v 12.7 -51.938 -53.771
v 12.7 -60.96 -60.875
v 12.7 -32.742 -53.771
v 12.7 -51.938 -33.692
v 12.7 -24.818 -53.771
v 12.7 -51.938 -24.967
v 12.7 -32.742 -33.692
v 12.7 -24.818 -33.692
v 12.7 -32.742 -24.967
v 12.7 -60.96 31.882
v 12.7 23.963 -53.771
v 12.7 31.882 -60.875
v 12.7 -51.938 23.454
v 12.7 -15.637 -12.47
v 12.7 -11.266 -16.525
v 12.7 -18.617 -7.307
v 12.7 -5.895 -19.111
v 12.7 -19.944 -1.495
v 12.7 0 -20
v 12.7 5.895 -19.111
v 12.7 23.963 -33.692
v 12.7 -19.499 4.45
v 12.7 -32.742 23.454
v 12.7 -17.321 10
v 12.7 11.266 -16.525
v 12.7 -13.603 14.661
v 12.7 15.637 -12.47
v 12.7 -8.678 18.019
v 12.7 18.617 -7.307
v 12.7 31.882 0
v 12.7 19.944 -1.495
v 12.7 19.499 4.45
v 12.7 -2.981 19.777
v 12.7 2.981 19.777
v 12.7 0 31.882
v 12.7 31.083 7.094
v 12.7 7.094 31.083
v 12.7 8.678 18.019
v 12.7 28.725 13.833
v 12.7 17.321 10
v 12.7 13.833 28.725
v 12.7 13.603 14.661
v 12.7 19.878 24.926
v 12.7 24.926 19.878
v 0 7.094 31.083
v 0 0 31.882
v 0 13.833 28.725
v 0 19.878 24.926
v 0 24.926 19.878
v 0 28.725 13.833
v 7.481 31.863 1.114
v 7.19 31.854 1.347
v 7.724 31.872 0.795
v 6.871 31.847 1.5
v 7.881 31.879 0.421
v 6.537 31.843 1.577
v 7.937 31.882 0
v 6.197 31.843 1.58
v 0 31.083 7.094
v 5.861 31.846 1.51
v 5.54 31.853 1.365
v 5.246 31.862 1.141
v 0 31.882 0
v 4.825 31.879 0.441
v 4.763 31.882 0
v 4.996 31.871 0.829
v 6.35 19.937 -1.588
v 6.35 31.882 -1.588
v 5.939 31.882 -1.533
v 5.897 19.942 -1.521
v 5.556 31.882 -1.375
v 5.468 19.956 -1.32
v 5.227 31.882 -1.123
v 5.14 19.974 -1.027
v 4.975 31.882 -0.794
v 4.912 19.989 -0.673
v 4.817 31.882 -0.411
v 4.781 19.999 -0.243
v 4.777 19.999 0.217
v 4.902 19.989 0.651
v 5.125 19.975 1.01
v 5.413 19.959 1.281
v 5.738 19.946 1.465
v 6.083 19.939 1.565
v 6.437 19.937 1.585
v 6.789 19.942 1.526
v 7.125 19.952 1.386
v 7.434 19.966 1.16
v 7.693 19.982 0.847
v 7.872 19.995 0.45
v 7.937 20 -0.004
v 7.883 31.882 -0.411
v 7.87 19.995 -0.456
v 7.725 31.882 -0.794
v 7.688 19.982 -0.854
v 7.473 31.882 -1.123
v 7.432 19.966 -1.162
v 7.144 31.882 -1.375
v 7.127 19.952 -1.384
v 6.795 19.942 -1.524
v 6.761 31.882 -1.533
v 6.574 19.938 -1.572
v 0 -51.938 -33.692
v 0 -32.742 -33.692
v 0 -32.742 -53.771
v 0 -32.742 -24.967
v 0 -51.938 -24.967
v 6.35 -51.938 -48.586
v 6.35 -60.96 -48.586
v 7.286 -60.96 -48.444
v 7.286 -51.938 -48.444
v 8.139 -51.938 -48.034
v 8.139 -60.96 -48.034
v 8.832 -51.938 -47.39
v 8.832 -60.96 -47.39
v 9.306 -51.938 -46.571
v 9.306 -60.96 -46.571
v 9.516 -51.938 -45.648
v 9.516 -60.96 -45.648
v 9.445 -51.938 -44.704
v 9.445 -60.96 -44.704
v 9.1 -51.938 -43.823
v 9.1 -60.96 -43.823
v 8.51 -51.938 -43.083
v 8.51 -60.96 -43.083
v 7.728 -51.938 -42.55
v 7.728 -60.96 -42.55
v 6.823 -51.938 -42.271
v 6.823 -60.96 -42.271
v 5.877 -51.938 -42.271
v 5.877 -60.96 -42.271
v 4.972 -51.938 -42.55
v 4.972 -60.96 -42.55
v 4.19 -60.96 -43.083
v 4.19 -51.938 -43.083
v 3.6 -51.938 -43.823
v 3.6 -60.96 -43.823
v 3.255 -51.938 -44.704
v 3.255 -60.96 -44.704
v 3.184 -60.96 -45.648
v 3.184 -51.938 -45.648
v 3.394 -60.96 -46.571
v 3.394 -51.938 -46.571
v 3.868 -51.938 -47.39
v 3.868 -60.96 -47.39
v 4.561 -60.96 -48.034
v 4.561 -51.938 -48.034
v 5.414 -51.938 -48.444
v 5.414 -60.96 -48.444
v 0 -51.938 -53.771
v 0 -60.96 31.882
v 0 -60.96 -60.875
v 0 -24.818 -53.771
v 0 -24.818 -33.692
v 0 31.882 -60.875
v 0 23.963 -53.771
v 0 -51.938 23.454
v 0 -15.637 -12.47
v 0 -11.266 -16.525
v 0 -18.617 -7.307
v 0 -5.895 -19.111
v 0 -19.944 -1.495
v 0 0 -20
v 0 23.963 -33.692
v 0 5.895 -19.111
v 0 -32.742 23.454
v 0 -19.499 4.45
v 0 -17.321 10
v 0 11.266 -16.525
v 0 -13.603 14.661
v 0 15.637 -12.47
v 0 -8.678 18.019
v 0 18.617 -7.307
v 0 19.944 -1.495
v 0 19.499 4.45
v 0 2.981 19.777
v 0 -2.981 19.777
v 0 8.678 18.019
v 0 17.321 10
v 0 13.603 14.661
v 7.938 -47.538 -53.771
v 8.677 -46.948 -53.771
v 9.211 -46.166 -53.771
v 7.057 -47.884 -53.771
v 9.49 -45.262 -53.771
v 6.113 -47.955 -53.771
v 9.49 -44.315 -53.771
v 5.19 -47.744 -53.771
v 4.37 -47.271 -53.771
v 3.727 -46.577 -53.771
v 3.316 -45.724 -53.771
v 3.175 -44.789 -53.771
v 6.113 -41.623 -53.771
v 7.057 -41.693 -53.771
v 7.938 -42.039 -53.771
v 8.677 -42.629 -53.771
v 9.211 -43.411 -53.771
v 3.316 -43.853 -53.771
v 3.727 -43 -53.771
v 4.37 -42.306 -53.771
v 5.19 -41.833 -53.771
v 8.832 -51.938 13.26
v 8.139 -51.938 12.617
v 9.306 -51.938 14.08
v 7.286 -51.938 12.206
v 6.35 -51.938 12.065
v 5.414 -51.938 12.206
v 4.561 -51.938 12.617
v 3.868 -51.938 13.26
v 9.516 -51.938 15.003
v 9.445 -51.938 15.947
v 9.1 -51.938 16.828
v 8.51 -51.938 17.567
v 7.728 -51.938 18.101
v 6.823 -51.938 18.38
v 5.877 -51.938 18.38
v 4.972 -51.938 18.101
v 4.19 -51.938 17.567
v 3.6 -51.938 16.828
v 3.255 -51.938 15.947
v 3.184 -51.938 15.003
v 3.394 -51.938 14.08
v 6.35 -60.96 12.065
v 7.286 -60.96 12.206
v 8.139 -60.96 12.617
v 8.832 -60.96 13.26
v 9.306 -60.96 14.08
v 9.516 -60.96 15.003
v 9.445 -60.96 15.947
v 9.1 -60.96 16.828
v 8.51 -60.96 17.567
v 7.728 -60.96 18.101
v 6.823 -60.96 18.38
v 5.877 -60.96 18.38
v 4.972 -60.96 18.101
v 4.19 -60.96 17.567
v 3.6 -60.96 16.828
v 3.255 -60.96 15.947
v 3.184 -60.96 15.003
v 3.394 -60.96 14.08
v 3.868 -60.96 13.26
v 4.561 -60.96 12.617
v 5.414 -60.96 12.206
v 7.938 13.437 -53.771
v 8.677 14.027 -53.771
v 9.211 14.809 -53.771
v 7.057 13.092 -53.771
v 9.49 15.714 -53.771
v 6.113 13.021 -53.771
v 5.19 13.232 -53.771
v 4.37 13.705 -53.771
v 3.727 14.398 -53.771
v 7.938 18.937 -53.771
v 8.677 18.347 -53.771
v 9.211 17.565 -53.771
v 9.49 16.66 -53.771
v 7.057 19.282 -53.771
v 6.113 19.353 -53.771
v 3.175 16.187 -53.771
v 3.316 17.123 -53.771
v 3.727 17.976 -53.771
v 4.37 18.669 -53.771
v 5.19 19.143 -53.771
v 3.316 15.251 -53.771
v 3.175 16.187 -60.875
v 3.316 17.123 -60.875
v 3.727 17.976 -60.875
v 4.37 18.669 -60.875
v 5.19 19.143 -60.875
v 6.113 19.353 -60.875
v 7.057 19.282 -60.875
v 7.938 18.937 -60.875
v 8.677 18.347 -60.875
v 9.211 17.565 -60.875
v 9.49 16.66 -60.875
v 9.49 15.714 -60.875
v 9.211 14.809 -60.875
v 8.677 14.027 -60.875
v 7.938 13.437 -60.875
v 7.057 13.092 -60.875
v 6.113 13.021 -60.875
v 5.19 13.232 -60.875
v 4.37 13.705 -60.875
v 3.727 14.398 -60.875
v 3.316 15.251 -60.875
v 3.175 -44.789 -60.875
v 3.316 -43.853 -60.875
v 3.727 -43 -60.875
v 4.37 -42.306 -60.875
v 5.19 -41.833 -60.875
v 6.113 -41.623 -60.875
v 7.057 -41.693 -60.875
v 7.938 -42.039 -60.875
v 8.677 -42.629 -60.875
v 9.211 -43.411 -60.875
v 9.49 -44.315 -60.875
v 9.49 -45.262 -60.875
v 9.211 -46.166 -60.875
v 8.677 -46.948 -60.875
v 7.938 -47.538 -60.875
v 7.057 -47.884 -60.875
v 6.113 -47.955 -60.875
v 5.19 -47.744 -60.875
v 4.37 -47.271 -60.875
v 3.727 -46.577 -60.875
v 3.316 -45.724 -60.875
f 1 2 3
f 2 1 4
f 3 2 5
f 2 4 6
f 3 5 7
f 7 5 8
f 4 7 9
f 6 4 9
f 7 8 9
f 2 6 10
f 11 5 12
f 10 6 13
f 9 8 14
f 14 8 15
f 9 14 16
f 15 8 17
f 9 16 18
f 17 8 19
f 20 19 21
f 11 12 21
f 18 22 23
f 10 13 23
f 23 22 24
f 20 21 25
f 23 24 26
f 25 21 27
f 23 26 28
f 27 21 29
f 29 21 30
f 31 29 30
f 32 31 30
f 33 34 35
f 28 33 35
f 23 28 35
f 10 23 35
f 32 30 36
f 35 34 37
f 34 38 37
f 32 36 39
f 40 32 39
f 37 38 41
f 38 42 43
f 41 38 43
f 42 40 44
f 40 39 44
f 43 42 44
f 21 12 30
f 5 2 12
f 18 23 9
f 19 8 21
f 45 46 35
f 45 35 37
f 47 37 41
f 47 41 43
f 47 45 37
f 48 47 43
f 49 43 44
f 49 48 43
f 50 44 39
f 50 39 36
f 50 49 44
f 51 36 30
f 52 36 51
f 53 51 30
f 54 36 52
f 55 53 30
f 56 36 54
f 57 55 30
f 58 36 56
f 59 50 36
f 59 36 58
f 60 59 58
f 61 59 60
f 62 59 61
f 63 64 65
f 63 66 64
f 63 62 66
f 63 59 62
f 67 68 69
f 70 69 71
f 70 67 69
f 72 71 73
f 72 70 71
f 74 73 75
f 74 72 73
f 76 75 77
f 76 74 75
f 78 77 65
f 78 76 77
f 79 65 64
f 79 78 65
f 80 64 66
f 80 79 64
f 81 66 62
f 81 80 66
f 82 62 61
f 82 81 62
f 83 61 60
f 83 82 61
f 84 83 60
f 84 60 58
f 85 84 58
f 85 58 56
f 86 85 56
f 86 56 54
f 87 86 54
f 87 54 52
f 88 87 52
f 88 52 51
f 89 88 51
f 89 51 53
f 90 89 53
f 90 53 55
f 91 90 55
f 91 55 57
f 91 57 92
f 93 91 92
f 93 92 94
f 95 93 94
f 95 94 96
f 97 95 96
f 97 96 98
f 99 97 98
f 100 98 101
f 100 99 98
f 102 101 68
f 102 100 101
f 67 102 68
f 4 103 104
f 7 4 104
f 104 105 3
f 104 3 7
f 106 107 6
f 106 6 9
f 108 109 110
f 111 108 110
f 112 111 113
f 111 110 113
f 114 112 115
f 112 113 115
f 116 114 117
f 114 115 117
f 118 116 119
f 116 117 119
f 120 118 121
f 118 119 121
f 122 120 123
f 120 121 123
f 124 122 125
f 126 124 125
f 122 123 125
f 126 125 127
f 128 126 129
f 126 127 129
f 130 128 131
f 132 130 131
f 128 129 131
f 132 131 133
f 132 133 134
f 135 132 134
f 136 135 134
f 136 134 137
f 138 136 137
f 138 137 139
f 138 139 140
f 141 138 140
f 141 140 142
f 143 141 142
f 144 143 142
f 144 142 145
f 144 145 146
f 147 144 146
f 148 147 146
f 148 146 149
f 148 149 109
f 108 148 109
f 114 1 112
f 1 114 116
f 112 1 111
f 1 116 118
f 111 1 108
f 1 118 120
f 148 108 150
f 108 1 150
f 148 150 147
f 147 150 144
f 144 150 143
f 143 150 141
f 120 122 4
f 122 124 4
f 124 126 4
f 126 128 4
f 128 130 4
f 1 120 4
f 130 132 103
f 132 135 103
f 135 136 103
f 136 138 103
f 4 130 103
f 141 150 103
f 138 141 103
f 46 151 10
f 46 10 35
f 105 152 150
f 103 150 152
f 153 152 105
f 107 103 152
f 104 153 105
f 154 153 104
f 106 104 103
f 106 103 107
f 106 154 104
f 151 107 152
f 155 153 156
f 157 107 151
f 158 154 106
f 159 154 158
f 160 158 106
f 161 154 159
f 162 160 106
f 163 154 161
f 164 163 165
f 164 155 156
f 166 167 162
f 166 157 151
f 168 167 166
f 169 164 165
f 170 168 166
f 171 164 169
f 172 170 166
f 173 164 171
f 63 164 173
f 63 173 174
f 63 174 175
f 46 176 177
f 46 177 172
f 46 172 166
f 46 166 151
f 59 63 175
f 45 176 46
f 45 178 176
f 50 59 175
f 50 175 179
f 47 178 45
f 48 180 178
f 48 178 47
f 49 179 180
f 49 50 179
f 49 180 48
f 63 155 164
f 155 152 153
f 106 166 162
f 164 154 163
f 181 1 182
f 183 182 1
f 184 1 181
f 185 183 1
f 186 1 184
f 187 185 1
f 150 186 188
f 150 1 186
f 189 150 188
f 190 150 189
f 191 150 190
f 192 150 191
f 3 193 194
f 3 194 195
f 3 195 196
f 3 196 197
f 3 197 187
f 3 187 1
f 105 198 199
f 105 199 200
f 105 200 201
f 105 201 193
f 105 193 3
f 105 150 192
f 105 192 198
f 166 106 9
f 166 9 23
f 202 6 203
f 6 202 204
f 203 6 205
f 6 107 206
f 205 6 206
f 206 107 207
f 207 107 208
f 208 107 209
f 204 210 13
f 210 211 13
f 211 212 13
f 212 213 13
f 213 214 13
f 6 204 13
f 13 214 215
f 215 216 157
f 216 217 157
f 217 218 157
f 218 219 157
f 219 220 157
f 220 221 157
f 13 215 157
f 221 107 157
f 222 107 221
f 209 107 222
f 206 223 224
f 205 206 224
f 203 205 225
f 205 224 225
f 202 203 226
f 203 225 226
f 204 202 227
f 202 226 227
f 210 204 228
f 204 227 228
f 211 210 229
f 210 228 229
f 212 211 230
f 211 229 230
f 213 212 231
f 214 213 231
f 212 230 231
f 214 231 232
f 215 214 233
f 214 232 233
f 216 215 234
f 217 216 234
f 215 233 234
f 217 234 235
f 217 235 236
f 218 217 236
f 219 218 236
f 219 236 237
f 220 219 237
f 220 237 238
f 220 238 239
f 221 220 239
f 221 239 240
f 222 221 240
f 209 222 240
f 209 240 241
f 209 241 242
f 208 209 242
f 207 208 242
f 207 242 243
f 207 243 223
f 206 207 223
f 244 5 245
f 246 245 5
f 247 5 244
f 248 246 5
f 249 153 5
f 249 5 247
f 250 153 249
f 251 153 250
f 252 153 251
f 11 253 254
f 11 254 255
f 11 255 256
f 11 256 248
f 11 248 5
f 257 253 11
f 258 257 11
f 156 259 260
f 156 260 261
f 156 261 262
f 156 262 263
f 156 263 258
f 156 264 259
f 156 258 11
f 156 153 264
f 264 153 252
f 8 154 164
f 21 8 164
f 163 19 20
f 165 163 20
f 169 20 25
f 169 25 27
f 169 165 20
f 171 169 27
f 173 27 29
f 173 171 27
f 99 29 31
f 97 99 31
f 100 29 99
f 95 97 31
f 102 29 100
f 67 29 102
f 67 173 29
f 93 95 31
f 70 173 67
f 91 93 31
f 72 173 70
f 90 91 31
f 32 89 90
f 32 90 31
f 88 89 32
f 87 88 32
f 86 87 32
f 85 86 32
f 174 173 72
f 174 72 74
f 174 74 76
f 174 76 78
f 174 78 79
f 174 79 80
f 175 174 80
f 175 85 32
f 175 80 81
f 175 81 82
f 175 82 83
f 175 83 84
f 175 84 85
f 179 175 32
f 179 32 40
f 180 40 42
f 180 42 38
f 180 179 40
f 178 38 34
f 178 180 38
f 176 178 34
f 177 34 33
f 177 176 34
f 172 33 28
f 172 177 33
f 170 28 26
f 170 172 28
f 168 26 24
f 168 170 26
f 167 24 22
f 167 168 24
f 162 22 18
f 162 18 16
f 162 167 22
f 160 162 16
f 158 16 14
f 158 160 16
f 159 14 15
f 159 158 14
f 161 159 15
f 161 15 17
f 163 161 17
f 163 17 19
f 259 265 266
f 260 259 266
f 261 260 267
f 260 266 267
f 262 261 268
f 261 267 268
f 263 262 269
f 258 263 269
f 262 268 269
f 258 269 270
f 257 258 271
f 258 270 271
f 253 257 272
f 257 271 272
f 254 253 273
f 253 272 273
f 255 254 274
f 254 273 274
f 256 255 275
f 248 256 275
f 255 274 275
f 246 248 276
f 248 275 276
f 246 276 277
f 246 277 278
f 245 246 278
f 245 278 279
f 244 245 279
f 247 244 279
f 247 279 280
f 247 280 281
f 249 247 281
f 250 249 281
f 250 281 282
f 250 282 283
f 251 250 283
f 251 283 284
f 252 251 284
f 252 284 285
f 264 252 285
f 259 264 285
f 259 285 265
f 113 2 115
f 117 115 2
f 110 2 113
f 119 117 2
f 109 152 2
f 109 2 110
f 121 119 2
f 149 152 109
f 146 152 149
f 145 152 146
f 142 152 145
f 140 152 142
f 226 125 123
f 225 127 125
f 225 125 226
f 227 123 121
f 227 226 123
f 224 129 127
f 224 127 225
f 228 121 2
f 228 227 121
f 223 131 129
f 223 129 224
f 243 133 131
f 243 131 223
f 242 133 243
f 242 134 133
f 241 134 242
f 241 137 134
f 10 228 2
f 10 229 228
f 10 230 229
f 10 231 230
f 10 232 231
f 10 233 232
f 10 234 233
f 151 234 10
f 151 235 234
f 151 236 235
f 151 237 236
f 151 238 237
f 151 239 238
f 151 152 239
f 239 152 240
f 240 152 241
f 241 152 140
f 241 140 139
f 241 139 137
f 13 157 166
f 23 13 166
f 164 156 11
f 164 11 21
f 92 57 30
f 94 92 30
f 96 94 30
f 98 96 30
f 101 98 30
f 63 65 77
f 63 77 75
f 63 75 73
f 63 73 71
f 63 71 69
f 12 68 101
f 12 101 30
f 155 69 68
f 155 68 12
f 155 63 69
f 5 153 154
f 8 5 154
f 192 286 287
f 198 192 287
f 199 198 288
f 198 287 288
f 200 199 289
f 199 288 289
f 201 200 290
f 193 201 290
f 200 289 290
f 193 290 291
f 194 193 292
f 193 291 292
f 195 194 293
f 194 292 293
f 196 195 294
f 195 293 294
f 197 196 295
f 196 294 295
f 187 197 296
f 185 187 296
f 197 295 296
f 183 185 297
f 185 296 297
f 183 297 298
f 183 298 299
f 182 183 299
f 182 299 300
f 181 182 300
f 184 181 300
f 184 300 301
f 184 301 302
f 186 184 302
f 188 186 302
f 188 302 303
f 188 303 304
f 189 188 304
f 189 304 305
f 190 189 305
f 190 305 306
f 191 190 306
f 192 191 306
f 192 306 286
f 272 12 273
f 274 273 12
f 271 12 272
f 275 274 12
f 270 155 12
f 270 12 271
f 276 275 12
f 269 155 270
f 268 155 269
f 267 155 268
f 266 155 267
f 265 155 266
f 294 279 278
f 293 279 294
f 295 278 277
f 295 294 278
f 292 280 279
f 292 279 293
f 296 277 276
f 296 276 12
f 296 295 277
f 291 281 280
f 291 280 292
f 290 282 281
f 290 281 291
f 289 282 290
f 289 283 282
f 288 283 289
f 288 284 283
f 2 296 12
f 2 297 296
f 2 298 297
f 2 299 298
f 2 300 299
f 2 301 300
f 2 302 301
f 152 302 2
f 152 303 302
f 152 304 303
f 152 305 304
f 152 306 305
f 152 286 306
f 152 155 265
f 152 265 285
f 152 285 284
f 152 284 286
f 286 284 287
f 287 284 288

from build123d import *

# Parameters (mm, degrees)
SKETCH1_R           = 20
BOSS_EXTRUDE1_DEPTH = 12.7
SKETCH2_R           = 1.5875
CUT_EXTRUDE1_DEPTH  = 88.081184849
SKETCH4_W           = 20.078494948
SKETCH4_H           = 48.78095735
SKETCH4_W_2         = 48.420880553
SKETCH4_H_2         = 19.195923741
CUT_EXTRUDE2_DEPTH  = 26.162
SKETCH5_R           = 3.175
CUT_EXTRUDE3_DEPTH  = 11.43
SKETCH6_R           = 3.175
CUT_EXTRUDE4_DEPTH  = 11.43


with BuildPart() as part:
    # Sketch1 → Boss-Extrude1 (new body)
    with BuildSketch(Plane(origin=(0, 0, 0), x_dir=(0, 0, -1), z_dir=(1, 0, 0))):
        with BuildLine():
            Line((0, 31.882172919), (31.882172919, 31.882172919))
            Line((31.882172919, 31.882172919), (60.87463474, 31.882172919))
            Line((60.87463474, 31.882172919), (60.87463474, -60.96))
            Line((60.87463474, -60.96), (-31.882172919, -60.96))
            Line((-31.882172919, -60.96), (-31.882172919, 0))
            ThreePointArc((-31.882172919, 0), (-22.54410067, 22.54410067), (0, 31.882172919))
        make_face()
        Circle(SKETCH1_R, mode=Mode.SUBTRACT)
    extrude(amount=BOSS_EXTRUDE1_DEPTH)

    # Sketch2 → Cut-Extrude1 (cut, through all)
    with BuildSketch(Plane(origin=(0, 0, 0), x_dir=(1, 0, 0), z_dir=(0, 1, 0))):
        with Locations(Location((6.35, 0, 0), (0, 0, 90))):
            Circle(SKETCH2_R)
    extrude(amount=CUT_EXTRUDE1_DEPTH, mode=Mode.SUBTRACT)

    # Sketch4 → Cut-Extrude2 (cut)
    with BuildSketch(Plane.ZY):
        with Locations((-43.731401429, -0.427222634)):
            Rectangle(SKETCH4_W, SKETCH4_H)
        with Locations((-0.75610861, -42.339905849)):
            Rectangle(SKETCH4_W_2, SKETCH4_H_2)
        with Locations((-43.731401429, -42.339905849)):
            Rectangle(SKETCH4_W, SKETCH4_H_2)
    extrude(amount=-CUT_EXTRUDE2_DEPTH, mode=Mode.SUBTRACT)

    # Sketch5 → Cut-Extrude3 (cut)
    with BuildSketch(Plane(origin=(0, 0, -60.87463474), x_dir=(-1, 0, 0), z_dir=(0, 0, -1))):
        with Locations((-6.35, 16.187024645)):
            Circle(SKETCH5_R)
        with Locations((-6.35, -44.788648077)):
            Circle(SKETCH5_R)
    extrude(amount=-CUT_EXTRUDE3_DEPTH, mode=Mode.SUBTRACT)

    # Sketch6 → Cut-Extrude4 (cut)
    with BuildSketch(Plane.XZ.offset(60.96)):
        with Locations(Location((6.35, 15.24, 0), (0, 0, 270))):
            Circle(SKETCH6_R)
        with Locations(Location((6.35, -45.41055385, 0), (0, 0, 270))):
            Circle(SKETCH6_R)
    extrude(amount=-CUT_EXTRUDE4_DEPTH, mode=Mode.SUBTRACT)


solid = part.part
